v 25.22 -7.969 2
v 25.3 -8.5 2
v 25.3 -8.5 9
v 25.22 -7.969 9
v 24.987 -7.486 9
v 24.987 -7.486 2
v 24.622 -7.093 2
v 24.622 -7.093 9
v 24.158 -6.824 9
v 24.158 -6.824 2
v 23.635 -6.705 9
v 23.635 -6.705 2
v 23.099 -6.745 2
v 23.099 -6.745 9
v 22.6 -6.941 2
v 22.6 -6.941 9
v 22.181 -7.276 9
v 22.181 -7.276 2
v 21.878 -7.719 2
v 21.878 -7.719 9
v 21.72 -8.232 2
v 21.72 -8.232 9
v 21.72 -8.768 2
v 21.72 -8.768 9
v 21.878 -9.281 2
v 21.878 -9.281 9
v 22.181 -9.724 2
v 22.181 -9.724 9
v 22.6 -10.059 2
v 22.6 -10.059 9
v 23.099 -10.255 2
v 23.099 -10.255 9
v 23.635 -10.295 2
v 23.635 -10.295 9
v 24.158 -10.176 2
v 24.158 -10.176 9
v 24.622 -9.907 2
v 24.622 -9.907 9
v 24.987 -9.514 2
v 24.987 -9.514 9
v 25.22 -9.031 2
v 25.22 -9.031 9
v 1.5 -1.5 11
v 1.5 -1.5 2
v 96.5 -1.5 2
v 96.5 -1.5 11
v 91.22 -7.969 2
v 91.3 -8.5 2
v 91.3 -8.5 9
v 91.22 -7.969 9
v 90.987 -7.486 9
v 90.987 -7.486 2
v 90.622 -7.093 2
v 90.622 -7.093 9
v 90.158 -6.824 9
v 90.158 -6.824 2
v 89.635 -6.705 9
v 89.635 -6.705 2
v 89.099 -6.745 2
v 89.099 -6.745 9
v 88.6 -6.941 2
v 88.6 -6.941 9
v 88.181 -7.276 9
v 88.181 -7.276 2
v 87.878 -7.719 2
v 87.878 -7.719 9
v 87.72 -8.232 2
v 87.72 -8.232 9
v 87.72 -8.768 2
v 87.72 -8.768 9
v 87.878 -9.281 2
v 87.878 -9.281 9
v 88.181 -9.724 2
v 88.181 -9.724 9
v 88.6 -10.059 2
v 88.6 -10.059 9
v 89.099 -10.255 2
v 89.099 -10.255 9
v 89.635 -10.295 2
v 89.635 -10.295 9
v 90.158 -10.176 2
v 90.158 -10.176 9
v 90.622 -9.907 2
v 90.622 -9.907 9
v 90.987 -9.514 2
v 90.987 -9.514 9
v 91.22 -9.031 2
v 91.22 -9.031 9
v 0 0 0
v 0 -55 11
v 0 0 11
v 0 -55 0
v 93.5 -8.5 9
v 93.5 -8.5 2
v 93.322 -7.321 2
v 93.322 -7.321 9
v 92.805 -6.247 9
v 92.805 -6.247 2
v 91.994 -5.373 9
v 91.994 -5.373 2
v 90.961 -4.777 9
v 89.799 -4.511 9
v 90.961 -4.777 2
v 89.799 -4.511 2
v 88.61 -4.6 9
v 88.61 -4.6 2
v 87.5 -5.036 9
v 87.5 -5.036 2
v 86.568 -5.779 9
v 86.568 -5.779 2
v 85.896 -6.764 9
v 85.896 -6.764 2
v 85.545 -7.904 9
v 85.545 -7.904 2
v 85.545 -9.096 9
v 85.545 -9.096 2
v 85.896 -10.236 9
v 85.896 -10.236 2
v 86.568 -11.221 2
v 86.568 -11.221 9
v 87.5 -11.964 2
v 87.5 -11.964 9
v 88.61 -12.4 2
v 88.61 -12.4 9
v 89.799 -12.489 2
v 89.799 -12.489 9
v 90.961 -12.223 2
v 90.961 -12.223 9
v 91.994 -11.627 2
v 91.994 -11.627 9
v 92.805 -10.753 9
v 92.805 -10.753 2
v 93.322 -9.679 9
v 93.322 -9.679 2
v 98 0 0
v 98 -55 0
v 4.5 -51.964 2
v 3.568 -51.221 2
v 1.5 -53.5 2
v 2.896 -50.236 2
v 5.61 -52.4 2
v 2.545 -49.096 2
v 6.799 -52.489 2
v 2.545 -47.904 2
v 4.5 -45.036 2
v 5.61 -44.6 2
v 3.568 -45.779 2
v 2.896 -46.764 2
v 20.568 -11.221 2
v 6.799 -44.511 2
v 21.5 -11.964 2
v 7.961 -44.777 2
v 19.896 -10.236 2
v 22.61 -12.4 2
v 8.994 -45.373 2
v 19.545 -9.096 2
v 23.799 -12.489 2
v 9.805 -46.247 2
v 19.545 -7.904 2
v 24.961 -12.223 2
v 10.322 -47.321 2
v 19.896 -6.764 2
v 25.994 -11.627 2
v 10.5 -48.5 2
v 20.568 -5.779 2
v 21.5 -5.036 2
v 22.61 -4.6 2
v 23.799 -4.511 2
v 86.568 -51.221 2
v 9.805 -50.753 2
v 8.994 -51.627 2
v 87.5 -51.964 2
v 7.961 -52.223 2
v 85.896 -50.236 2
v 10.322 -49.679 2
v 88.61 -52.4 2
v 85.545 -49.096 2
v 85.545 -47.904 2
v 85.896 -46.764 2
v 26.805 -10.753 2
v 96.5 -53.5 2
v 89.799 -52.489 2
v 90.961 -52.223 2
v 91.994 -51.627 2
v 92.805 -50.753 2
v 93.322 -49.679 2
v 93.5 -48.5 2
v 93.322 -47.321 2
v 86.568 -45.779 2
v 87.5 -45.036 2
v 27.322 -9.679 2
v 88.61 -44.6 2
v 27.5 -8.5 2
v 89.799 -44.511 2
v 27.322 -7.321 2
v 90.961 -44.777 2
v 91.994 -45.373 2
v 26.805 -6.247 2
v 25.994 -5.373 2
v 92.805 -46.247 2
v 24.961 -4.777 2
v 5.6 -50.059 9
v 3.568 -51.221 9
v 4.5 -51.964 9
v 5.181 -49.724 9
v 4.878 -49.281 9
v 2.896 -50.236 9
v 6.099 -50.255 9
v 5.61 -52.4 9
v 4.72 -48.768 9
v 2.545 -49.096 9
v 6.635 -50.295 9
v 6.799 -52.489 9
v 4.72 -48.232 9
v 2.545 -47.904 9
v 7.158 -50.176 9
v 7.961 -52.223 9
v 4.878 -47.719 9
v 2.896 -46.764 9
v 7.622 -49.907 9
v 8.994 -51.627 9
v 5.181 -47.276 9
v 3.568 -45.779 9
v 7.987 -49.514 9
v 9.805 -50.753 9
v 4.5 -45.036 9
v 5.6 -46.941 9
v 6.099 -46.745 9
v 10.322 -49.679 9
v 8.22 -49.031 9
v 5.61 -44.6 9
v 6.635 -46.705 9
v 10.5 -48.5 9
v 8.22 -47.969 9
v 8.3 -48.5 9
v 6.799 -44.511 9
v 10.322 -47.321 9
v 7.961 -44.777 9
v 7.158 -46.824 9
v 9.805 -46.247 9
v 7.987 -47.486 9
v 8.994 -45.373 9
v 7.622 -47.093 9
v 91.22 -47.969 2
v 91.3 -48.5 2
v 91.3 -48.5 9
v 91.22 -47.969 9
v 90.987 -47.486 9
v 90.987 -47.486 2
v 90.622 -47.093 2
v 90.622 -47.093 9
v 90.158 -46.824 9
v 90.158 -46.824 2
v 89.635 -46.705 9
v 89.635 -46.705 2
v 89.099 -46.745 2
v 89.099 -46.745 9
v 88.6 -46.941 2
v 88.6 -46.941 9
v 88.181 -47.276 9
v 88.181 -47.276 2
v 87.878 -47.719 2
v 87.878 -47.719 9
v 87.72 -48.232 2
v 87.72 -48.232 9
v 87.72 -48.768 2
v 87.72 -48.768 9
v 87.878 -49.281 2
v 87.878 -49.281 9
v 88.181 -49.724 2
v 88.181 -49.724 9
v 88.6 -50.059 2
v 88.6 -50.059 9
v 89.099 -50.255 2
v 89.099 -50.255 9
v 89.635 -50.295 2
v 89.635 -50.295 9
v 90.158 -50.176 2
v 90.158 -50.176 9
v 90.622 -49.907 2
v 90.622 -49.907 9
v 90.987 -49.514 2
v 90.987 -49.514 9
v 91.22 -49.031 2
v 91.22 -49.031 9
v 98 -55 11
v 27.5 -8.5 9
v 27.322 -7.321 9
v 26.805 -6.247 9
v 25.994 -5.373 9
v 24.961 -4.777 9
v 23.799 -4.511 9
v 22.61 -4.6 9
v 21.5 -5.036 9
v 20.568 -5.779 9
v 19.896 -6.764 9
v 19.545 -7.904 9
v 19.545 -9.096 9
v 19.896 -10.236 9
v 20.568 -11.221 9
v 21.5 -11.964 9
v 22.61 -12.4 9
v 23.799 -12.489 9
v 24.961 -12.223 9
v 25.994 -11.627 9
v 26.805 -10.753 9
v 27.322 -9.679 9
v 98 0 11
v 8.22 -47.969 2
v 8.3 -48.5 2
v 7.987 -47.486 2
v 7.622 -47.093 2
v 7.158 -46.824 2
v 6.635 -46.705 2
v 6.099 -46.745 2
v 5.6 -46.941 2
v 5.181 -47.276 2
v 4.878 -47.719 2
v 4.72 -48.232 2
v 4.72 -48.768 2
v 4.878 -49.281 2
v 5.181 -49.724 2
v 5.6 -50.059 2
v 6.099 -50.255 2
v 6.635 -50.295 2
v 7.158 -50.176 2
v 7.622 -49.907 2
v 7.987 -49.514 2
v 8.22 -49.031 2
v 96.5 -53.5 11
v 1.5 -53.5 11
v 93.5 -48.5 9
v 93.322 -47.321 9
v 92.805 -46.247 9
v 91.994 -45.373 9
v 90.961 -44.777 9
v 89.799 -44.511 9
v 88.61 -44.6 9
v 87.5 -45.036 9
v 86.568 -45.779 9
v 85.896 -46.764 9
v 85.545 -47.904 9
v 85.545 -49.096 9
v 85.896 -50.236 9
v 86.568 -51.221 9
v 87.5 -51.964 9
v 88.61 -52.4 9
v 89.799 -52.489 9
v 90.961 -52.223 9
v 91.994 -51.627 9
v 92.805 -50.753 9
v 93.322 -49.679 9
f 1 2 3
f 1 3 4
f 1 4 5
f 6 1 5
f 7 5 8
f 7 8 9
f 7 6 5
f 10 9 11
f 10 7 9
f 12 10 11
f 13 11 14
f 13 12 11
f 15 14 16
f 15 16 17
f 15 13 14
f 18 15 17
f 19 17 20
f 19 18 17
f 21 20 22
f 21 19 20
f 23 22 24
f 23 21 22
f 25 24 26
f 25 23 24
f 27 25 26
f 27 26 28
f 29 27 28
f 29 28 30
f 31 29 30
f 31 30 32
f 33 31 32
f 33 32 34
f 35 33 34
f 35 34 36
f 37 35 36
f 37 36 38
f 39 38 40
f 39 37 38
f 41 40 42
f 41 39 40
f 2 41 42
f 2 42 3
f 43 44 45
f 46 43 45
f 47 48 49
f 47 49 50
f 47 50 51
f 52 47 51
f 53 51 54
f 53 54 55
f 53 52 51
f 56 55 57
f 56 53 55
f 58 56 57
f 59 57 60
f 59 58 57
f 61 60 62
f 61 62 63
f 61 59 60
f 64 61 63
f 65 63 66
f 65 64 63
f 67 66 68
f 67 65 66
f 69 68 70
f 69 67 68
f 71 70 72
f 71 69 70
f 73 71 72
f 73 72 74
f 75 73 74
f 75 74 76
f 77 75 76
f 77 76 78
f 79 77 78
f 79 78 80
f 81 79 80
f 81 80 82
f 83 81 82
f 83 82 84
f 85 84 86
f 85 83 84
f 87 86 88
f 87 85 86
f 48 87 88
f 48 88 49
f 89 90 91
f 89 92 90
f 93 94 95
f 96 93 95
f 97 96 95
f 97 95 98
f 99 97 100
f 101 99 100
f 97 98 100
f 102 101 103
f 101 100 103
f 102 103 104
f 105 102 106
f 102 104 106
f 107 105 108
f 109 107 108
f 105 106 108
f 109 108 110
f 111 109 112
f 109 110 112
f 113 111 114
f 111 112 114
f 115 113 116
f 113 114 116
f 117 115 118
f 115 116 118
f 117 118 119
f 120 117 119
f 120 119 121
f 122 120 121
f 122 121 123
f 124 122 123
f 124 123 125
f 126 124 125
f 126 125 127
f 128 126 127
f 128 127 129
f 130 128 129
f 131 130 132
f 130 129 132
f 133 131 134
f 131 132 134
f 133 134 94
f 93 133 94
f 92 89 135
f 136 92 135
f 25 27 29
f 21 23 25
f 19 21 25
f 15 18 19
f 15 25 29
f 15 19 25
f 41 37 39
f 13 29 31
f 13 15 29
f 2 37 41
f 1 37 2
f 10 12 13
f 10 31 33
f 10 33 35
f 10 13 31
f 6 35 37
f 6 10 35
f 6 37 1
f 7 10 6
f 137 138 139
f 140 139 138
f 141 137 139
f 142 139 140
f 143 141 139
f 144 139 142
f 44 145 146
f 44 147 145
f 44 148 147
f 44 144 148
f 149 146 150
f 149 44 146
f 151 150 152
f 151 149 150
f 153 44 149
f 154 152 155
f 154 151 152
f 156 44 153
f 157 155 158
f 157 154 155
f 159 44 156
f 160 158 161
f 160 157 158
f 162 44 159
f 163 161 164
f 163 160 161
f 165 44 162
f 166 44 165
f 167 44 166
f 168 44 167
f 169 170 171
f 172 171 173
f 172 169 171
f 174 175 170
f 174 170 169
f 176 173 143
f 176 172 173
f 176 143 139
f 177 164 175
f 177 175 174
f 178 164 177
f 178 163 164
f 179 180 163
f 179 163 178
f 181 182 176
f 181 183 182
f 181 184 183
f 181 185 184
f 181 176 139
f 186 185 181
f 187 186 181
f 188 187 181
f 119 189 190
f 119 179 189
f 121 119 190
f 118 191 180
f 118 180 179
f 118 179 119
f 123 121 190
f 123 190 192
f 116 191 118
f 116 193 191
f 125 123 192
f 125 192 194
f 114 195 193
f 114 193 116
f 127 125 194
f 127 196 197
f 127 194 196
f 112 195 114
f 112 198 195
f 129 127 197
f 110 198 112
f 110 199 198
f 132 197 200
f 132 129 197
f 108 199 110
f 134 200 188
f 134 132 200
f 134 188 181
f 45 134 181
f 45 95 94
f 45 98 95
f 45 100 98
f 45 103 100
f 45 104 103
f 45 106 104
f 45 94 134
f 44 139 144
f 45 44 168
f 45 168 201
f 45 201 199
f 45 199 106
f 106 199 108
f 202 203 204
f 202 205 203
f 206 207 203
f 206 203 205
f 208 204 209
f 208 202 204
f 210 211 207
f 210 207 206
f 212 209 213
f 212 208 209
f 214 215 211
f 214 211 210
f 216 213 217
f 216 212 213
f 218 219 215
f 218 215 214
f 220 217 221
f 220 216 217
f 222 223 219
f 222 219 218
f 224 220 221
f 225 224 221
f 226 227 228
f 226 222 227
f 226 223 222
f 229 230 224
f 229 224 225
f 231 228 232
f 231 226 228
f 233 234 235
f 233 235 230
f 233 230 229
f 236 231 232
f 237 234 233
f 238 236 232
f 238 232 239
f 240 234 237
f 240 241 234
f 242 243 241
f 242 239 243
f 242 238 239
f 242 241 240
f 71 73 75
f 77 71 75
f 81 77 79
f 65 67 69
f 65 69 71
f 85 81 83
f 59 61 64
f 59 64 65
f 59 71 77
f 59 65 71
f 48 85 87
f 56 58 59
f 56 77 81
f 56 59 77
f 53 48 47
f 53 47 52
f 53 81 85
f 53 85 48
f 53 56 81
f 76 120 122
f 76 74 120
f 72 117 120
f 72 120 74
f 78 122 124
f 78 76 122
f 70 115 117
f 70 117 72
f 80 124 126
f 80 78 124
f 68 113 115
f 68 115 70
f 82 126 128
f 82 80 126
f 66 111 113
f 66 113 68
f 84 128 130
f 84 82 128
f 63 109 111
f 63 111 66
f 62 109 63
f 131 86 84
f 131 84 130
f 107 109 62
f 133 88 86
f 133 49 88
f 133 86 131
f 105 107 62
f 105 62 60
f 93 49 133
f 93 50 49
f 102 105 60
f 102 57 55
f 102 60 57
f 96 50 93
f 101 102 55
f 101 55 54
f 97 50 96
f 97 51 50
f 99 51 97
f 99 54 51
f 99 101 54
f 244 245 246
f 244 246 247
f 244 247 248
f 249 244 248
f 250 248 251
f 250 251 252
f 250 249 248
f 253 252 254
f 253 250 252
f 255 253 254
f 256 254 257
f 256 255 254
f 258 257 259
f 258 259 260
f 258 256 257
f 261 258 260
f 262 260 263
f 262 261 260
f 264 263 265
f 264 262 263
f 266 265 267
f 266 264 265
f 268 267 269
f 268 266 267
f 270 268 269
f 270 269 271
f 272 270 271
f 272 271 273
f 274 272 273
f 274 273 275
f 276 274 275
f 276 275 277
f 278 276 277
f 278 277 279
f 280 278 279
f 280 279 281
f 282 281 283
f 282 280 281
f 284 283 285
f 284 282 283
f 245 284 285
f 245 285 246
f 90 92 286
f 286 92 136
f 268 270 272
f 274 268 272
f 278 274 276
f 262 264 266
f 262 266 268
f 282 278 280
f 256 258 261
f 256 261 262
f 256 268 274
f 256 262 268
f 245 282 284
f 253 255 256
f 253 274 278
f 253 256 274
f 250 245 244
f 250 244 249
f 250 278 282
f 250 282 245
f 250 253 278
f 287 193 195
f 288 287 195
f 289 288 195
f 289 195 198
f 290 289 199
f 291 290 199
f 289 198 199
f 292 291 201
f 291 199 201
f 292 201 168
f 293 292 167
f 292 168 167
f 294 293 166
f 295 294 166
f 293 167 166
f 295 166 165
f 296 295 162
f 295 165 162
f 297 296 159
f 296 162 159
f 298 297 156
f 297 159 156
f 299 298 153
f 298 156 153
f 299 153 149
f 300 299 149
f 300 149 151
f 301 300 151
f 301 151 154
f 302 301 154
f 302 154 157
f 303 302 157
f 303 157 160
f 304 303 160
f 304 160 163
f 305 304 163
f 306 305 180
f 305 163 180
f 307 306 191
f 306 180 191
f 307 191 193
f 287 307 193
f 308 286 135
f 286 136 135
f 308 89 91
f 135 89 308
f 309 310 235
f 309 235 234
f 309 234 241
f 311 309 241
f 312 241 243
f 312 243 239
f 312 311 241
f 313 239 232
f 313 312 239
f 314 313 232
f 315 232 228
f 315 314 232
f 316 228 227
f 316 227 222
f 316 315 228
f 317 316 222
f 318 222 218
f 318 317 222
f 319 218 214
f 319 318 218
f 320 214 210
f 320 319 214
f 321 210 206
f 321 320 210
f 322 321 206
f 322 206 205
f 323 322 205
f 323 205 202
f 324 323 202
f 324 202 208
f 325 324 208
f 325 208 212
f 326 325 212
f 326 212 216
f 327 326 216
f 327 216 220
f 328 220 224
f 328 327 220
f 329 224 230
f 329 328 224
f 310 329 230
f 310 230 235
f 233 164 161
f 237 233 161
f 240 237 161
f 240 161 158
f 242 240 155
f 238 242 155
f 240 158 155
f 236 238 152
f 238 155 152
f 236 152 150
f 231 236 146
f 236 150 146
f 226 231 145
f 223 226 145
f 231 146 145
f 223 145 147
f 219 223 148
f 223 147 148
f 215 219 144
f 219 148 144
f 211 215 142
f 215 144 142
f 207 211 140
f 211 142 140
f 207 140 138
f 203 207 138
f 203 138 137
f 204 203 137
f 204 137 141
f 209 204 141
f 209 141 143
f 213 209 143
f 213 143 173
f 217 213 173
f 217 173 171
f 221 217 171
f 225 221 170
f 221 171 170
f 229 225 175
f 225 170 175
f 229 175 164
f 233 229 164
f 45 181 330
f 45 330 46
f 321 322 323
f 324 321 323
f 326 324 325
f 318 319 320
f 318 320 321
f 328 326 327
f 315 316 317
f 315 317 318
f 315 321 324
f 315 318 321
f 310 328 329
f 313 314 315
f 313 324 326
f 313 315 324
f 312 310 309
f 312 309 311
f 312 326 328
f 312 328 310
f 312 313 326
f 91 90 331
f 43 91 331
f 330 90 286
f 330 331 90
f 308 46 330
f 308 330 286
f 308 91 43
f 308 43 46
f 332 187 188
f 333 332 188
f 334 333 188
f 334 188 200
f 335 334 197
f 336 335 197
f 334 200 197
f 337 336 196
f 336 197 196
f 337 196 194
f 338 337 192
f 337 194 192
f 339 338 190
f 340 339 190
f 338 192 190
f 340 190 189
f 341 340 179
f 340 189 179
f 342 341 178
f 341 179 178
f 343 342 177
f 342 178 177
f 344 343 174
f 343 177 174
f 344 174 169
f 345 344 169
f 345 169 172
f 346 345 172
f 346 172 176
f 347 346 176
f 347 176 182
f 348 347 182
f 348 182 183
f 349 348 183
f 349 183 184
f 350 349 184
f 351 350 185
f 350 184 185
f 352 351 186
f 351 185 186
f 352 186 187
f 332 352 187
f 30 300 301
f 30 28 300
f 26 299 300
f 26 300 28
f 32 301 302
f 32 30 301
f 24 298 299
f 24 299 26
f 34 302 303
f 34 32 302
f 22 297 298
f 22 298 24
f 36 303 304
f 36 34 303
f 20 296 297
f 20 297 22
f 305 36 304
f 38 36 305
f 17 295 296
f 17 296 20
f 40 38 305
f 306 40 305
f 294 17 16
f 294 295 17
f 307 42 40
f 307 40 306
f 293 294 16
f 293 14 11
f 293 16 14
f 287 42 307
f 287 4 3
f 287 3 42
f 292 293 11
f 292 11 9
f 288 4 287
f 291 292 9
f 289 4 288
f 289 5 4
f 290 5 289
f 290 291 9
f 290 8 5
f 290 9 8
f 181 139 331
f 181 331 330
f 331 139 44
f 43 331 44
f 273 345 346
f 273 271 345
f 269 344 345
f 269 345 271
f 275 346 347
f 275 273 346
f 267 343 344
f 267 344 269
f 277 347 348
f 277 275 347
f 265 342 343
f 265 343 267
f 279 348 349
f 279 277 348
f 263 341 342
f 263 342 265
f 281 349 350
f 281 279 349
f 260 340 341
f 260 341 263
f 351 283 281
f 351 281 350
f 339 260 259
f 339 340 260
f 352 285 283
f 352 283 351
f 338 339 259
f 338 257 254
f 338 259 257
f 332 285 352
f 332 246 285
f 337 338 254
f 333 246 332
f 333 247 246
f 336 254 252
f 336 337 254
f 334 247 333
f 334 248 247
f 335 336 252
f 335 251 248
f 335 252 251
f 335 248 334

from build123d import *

# Parameters (mm, degrees)
SKETCH1_W           = 98
SKETCH1_H           = 55
BOSS_EXTRUDE1_DEPTH = 2
SKETCH2_W           = 98
SKETCH2_H           = 55
SKETCH2_W_2         = 95
SKETCH2_H_2         = 52
BOSS_EXTRUDE2_DEPTH = 9
SKETCH3_R           = 4
SKETCH3_R_2         = 1.8
BOSS_EXTRUDE3_DEPTH = 7


with BuildPart() as part:
    # Sketch1 → Boss-Extrude1 (new body)
    with BuildSketch(Plane.XY):
        with Locations((49, -27.5)):
            Rectangle(SKETCH1_W, SKETCH1_H)
    extrude(amount=BOSS_EXTRUDE1_DEPTH)

    # Sketch2 → Boss-Extrude2 (add)
    with BuildSketch(Plane.XY.offset(2)):
        with Locations((49, -27.5)):
            Rectangle(SKETCH2_W, SKETCH2_H)
        with Locations((49, -27.5)):
            Rectangle(SKETCH2_W_2, SKETCH2_H_2, mode=Mode.SUBTRACT)
    extrude(amount=BOSS_EXTRUDE2_DEPTH)

    # Sketch3 → Boss-Extrude3 (add)
    with BuildSketch(Plane.XY.offset(2)):
        with Locations((89.5, -8.5)):
            Circle(SKETCH3_R)
        with Locations((89.5, -8.5)):
            Circle(SKETCH3_R_2, mode=Mode.SUBTRACT)
        with Locations((89.5, -48.5)):
            Circle(SKETCH3_R)
        with Locations((89.5, -48.5)):
            Circle(SKETCH3_R_2, mode=Mode.SUBTRACT)
        with Locations((6.5, -48.5)):
            Circle(SKETCH3_R)
        with Locations((6.5, -48.5)):
            Circle(SKETCH3_R_2, mode=Mode.SUBTRACT)
        with Locations((23.5, -8.5)):
            Circle(SKETCH3_R)
        with Locations((23.5, -8.5)):
            Circle(SKETCH3_R_2, mode=Mode.SUBTRACT)
    extrude(amount=BOSS_EXTRUDE3_DEPTH)


solid = part.part
